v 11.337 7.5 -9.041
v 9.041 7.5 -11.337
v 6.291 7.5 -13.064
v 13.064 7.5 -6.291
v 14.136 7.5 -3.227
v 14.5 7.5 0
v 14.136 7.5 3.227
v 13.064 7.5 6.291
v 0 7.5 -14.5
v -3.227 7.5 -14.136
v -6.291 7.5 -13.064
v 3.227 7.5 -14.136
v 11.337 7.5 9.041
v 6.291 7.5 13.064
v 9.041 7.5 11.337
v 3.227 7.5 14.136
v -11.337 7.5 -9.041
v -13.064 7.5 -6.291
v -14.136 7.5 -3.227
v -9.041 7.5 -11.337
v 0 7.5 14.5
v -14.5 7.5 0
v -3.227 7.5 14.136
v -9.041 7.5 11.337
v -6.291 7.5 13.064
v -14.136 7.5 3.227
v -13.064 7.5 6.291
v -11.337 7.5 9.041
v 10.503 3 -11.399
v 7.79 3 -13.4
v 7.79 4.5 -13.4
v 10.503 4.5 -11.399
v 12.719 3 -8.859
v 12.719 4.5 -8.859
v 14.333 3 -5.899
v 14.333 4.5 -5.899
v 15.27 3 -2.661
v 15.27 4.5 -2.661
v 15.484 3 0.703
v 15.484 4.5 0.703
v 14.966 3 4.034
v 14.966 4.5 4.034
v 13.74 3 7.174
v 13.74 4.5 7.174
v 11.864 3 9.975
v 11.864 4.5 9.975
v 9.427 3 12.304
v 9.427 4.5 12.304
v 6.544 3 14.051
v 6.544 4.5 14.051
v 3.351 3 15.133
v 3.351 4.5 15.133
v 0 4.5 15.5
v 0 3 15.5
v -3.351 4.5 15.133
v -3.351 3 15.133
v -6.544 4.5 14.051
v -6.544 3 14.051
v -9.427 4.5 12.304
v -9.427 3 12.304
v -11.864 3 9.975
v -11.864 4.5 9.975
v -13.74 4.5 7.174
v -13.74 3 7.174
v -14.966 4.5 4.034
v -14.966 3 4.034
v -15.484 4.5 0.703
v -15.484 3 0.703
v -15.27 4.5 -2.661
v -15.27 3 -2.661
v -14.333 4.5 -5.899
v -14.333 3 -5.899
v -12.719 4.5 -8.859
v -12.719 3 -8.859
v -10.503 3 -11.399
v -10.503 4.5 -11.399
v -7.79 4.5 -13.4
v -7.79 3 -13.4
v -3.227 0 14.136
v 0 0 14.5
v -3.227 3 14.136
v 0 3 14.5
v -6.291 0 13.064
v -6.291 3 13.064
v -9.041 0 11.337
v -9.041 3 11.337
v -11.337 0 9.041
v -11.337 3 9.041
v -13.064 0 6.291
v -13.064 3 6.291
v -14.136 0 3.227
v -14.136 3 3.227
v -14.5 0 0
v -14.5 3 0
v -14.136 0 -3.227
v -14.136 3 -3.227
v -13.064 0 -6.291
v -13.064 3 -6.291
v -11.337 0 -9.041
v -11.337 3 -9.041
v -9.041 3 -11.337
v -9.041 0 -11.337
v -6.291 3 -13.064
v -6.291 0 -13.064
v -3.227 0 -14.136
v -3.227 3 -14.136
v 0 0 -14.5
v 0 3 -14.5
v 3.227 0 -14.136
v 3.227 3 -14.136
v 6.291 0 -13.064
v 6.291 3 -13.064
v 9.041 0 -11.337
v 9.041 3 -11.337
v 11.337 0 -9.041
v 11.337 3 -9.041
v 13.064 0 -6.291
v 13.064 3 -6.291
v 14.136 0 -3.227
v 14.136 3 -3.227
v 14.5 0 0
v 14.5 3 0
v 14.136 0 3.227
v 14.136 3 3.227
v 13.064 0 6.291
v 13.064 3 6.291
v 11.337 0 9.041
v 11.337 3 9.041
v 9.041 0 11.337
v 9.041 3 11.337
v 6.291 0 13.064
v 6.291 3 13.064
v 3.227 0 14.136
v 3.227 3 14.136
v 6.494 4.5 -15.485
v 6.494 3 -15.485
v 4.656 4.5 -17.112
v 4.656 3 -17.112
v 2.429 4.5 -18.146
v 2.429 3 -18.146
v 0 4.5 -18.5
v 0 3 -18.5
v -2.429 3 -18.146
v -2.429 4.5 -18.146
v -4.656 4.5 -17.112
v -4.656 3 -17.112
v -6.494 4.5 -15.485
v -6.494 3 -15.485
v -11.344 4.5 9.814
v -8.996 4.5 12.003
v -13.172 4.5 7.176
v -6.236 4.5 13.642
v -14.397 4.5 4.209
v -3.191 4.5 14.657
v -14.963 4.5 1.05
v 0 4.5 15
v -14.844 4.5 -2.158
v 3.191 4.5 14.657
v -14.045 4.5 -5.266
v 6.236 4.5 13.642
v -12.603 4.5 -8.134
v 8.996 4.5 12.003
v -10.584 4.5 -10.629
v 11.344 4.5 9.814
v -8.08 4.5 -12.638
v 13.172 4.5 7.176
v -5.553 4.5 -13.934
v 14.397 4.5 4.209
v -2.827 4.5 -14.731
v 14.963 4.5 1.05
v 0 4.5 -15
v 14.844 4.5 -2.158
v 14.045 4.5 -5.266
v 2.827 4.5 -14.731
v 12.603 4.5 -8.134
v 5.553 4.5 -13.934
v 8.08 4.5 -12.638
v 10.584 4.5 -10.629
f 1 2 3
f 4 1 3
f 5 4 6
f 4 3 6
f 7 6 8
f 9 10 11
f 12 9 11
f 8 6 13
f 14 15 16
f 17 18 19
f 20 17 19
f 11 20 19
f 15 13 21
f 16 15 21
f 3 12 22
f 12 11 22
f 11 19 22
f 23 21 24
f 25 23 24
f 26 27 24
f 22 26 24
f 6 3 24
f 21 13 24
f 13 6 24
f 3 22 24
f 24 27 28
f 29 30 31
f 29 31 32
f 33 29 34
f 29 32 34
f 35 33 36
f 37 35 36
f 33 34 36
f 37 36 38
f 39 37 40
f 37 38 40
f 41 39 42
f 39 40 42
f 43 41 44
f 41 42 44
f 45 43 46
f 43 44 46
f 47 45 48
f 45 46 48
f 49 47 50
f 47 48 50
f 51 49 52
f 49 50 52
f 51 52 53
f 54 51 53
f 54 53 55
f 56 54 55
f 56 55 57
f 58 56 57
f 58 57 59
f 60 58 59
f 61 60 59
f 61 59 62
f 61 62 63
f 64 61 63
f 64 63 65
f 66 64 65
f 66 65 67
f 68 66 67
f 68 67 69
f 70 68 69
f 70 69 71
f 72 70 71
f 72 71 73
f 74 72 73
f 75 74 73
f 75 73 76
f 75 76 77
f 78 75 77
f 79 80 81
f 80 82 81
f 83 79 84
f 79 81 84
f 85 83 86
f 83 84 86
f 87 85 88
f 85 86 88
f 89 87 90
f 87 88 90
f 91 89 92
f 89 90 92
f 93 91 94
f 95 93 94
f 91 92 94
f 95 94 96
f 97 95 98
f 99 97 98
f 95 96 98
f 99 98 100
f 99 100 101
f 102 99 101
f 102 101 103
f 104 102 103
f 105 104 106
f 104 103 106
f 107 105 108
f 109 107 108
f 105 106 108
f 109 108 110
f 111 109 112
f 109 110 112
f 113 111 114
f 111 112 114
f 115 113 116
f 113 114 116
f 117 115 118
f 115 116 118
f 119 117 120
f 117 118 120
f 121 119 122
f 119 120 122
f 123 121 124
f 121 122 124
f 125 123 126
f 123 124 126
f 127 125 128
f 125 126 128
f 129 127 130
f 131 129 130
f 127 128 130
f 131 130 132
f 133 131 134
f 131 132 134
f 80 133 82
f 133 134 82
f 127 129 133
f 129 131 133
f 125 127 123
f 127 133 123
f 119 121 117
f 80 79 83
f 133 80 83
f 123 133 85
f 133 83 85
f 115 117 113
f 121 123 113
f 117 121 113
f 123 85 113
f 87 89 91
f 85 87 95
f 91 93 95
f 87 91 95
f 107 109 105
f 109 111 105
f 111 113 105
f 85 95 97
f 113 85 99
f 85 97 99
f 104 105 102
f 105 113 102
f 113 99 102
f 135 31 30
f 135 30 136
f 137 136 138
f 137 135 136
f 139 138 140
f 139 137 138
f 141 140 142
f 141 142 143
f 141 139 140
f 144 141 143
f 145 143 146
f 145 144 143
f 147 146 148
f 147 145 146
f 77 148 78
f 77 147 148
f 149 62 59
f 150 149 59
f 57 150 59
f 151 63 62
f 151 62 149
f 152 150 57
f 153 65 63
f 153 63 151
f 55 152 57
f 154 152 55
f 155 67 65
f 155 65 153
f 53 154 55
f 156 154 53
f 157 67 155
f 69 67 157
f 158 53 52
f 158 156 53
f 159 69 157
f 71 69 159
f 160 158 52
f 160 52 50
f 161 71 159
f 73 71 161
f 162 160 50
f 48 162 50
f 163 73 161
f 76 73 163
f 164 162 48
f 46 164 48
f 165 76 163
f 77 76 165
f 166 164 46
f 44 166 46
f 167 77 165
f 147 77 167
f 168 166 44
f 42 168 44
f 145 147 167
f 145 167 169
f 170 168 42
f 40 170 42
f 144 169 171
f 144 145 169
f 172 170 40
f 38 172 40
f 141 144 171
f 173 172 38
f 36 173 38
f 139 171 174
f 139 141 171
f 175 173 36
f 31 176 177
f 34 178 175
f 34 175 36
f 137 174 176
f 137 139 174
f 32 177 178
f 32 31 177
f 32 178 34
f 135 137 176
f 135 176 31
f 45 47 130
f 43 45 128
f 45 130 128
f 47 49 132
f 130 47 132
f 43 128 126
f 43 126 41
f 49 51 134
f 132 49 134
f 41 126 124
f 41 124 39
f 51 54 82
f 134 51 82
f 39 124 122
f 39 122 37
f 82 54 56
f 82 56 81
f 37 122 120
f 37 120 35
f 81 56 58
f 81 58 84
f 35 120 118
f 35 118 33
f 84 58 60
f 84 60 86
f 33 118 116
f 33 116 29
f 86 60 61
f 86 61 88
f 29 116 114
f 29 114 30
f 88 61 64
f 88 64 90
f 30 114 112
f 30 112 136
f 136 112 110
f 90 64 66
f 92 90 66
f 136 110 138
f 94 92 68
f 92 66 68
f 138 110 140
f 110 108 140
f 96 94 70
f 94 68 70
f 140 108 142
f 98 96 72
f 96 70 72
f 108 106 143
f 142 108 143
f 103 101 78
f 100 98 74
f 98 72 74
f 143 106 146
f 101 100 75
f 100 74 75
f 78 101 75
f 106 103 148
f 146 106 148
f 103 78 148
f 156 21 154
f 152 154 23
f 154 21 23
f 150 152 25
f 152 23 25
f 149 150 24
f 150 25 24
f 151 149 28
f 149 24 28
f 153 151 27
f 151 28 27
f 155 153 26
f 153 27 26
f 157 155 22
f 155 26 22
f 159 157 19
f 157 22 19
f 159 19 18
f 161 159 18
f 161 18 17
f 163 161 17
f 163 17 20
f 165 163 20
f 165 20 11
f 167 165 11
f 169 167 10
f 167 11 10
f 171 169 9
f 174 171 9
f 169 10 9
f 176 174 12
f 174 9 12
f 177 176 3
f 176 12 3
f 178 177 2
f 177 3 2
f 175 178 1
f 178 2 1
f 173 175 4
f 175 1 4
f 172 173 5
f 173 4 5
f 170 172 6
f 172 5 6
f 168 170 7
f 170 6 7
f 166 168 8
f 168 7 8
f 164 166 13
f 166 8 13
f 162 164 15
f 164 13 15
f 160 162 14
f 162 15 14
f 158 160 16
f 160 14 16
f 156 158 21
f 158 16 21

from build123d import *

# Parameters (mm, degrees)
BOSS_EXTRUDE1_DEPTH = 1.5


with BuildPart() as part:
    # Sketch1 → Revolve1 (revolve)
    with BuildSketch(Plane.XY, mode=Mode.PRIVATE) as revolve1_sk:
        Polygon((0, 0), (14.5, 0), (14.5, 3), (15.5, 3), (15.5, 4.5), (15, 4.5), (14.5, 7.5), (0, 7.5), align=None)
    revolve(revolve1_sk.sketch.rotate(Axis((0, 7.5, 0), (0, -1, 0)), 90), axis=Axis((0, 7.5, 0), (0, -1, 0)))

    # Sketch2 → Boss-Extrude1 (add)
    with BuildSketch(Plane(origin=(0, 4.5, 0), x_dir=(1, 0, 0), z_dir=(0, 1, 0))):
        with BuildLine():
            ThreePointArc((8.080445146, 12.6375), (0, 18.5), (-8.080445146, 12.6375))
            ThreePointArc((-8.080445146, 12.6375), (0, 15), (8.080445146, 12.6375))
        make_face()
    extrude(amount=-BOSS_EXTRUDE1_DEPTH)


solid = part.part
